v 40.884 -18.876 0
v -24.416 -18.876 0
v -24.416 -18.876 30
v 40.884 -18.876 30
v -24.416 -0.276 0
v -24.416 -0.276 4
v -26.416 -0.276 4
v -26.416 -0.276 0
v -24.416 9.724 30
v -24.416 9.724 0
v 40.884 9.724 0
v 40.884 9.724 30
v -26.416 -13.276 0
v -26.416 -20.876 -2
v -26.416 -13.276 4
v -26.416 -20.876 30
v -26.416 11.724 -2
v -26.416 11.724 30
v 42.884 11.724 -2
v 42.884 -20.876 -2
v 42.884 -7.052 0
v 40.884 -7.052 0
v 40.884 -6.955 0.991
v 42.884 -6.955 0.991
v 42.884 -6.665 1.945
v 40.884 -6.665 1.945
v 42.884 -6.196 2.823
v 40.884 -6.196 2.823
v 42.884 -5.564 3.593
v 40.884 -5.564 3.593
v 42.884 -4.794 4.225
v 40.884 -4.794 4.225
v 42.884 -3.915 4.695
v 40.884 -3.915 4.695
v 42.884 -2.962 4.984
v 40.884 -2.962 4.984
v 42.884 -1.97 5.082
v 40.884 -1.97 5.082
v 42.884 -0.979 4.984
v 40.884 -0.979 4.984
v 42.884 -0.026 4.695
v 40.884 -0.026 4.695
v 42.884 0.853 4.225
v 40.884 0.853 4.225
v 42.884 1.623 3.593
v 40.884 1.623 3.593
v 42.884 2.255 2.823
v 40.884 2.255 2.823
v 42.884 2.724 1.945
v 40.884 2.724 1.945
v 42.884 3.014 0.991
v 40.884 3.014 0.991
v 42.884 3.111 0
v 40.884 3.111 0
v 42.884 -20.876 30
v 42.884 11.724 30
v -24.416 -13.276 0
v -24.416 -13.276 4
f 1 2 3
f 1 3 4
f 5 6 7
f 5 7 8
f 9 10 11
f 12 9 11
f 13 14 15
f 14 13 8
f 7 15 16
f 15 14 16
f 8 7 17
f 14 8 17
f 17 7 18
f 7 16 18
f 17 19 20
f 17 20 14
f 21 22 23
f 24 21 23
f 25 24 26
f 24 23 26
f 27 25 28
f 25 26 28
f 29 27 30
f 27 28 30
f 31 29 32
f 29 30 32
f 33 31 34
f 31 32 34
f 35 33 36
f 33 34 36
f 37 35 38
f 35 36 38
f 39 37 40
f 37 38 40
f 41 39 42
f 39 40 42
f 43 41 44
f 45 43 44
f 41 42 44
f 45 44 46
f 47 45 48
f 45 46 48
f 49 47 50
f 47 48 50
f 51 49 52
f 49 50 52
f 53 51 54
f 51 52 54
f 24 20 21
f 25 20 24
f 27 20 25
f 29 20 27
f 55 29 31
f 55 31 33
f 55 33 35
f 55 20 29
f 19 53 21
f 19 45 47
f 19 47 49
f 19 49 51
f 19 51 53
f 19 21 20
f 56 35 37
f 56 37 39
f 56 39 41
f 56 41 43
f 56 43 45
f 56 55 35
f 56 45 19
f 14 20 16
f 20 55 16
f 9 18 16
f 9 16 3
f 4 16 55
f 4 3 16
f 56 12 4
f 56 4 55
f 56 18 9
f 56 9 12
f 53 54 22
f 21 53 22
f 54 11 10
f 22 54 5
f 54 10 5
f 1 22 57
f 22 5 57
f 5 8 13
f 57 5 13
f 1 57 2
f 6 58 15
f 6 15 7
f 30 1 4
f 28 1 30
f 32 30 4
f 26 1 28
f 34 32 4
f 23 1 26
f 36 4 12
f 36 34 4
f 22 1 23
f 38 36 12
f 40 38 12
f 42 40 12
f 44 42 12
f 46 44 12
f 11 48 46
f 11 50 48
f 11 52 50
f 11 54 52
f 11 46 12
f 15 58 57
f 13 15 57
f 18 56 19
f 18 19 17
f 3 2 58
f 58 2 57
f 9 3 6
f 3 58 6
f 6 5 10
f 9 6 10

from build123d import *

# Parameters (mm, degrees)
ESQUISSE1_W             = 69.3
ESQUISSE1_H             = 32.6
ESQUISSE1_W_2           = 65.3
ESQUISSE1_H_2           = 28.6
BOSS_EXTRU_1_DEPTH      = 30
ESQUISSE3_W             = 69.3
ESQUISSE3_H             = 32.6
BOSS_EXTRU_2_DEPTH      = 2
ESQUISSE4_W             = 4
ESQUISSE4_H             = 13
ENL_V_MAT_EXTRU_1_DEPTH = 18
ENL_V_MAT_EXTRU_2_DEPTH = 18


with BuildPart() as part:
    # Esquisse1 → Boss.-Extru.1 (new body)
    with BuildSketch(Plane.XY):
        with Locations((8.234452659, -4.576404494)):
            Rectangle(ESQUISSE1_W, ESQUISSE1_H)
        with Locations((8.234452659, -4.576404494)):
            Rectangle(ESQUISSE1_W_2, ESQUISSE1_H_2, mode=Mode.SUBTRACT)
    extrude(amount=BOSS_EXTRU_1_DEPTH)

    # Esquisse3 → Boss.-Extru.2 (add)
    with BuildSketch(Plane(origin=(0, 0, 0), x_dir=(-1, 0, 0), z_dir=(0, 0, -1))):
        with Locations((-8.234452659, -4.576404494)):
            Rectangle(ESQUISSE3_W, ESQUISSE3_H)
    extrude(amount=BOSS_EXTRU_2_DEPTH)

    # Esquisse4 → Enlèv. mat.-Extru.1 (cut)
    with BuildSketch(Plane(origin=(-24.415547341, 0, 0), x_dir=(0, 0, -1), z_dir=(1, 0, 0))):
        with Locations((-2, -6.776404494)):
            Rectangle(ESQUISSE4_W, ESQUISSE4_H)
    extrude(amount=-ENL_V_MAT_EXTRU_1_DEPTH, mode=Mode.SUBTRACT)

    # Esquisse5 → Enlèv. mat.-Extru.2 (cut)
    with BuildSketch(Plane.ZY.offset(-40.884452659)):
        with BuildLine():
            Line((0, 3.111294122), (0, -7.052256907))
            ThreePointArc((0, -7.052256907), (5.081775514, -1.970481392), (0, 3.111294122))
        make_face()
    extrude(amount=-ENL_V_MAT_EXTRU_2_DEPTH, mode=Mode.SUBTRACT)


solid = part.part
